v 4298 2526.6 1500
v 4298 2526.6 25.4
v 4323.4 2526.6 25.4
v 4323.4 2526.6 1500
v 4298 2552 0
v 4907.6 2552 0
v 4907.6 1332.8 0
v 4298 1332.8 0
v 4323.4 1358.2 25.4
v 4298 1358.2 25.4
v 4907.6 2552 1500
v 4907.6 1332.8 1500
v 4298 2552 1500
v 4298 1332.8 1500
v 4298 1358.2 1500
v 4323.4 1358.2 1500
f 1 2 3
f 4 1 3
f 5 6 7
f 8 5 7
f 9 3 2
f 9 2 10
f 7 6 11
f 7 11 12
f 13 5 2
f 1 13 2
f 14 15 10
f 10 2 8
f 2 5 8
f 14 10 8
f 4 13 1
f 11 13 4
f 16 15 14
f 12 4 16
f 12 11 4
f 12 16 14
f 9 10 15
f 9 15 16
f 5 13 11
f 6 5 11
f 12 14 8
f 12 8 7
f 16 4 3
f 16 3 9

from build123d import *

# Parameters (mm, degrees)
BOX006_W               = 1168.4
BOX006_H               = 25.4
BOX006_DEPTH           = 1500
BOX005_W               = 1219.2
BOX005_H               = 609.6
BOX005_DEPTH           = 1500
CUT004_PLACEMENT_ANGLE = 270


with BuildPart() as cube006:
    # Box006 → Box006 (new body)
    with BuildSketch(Plane(origin=(25.4, 0, 25.4), x_dir=(1, 0, 0), z_dir=(0, 0, 1))):
        with Locations((584.2, 12.7)):
            Rectangle(BOX006_W, BOX006_H)
    extrude(amount=BOX006_DEPTH)


with BuildPart() as cut004:
    # Box005 → Box005 (new body)
    with BuildSketch(Plane.XY):
        with Locations((609.6, 304.8)):
            Rectangle(BOX005_W, BOX005_H)
    extrude(amount=BOX005_DEPTH)

    # Cut004: cut Cube006
    add(cube006.part, mode=Mode.SUBTRACT)


with BuildPart() as cut004_1:
    # Cut004 placement: moved
    add(cut004.part.moved(Location((4298, 2552, 0))).rotate(Axis((4298, 2552, 0), (0, 0, 1)), CUT004_PLACEMENT_ANGLE))


solid = cut004_1.part
